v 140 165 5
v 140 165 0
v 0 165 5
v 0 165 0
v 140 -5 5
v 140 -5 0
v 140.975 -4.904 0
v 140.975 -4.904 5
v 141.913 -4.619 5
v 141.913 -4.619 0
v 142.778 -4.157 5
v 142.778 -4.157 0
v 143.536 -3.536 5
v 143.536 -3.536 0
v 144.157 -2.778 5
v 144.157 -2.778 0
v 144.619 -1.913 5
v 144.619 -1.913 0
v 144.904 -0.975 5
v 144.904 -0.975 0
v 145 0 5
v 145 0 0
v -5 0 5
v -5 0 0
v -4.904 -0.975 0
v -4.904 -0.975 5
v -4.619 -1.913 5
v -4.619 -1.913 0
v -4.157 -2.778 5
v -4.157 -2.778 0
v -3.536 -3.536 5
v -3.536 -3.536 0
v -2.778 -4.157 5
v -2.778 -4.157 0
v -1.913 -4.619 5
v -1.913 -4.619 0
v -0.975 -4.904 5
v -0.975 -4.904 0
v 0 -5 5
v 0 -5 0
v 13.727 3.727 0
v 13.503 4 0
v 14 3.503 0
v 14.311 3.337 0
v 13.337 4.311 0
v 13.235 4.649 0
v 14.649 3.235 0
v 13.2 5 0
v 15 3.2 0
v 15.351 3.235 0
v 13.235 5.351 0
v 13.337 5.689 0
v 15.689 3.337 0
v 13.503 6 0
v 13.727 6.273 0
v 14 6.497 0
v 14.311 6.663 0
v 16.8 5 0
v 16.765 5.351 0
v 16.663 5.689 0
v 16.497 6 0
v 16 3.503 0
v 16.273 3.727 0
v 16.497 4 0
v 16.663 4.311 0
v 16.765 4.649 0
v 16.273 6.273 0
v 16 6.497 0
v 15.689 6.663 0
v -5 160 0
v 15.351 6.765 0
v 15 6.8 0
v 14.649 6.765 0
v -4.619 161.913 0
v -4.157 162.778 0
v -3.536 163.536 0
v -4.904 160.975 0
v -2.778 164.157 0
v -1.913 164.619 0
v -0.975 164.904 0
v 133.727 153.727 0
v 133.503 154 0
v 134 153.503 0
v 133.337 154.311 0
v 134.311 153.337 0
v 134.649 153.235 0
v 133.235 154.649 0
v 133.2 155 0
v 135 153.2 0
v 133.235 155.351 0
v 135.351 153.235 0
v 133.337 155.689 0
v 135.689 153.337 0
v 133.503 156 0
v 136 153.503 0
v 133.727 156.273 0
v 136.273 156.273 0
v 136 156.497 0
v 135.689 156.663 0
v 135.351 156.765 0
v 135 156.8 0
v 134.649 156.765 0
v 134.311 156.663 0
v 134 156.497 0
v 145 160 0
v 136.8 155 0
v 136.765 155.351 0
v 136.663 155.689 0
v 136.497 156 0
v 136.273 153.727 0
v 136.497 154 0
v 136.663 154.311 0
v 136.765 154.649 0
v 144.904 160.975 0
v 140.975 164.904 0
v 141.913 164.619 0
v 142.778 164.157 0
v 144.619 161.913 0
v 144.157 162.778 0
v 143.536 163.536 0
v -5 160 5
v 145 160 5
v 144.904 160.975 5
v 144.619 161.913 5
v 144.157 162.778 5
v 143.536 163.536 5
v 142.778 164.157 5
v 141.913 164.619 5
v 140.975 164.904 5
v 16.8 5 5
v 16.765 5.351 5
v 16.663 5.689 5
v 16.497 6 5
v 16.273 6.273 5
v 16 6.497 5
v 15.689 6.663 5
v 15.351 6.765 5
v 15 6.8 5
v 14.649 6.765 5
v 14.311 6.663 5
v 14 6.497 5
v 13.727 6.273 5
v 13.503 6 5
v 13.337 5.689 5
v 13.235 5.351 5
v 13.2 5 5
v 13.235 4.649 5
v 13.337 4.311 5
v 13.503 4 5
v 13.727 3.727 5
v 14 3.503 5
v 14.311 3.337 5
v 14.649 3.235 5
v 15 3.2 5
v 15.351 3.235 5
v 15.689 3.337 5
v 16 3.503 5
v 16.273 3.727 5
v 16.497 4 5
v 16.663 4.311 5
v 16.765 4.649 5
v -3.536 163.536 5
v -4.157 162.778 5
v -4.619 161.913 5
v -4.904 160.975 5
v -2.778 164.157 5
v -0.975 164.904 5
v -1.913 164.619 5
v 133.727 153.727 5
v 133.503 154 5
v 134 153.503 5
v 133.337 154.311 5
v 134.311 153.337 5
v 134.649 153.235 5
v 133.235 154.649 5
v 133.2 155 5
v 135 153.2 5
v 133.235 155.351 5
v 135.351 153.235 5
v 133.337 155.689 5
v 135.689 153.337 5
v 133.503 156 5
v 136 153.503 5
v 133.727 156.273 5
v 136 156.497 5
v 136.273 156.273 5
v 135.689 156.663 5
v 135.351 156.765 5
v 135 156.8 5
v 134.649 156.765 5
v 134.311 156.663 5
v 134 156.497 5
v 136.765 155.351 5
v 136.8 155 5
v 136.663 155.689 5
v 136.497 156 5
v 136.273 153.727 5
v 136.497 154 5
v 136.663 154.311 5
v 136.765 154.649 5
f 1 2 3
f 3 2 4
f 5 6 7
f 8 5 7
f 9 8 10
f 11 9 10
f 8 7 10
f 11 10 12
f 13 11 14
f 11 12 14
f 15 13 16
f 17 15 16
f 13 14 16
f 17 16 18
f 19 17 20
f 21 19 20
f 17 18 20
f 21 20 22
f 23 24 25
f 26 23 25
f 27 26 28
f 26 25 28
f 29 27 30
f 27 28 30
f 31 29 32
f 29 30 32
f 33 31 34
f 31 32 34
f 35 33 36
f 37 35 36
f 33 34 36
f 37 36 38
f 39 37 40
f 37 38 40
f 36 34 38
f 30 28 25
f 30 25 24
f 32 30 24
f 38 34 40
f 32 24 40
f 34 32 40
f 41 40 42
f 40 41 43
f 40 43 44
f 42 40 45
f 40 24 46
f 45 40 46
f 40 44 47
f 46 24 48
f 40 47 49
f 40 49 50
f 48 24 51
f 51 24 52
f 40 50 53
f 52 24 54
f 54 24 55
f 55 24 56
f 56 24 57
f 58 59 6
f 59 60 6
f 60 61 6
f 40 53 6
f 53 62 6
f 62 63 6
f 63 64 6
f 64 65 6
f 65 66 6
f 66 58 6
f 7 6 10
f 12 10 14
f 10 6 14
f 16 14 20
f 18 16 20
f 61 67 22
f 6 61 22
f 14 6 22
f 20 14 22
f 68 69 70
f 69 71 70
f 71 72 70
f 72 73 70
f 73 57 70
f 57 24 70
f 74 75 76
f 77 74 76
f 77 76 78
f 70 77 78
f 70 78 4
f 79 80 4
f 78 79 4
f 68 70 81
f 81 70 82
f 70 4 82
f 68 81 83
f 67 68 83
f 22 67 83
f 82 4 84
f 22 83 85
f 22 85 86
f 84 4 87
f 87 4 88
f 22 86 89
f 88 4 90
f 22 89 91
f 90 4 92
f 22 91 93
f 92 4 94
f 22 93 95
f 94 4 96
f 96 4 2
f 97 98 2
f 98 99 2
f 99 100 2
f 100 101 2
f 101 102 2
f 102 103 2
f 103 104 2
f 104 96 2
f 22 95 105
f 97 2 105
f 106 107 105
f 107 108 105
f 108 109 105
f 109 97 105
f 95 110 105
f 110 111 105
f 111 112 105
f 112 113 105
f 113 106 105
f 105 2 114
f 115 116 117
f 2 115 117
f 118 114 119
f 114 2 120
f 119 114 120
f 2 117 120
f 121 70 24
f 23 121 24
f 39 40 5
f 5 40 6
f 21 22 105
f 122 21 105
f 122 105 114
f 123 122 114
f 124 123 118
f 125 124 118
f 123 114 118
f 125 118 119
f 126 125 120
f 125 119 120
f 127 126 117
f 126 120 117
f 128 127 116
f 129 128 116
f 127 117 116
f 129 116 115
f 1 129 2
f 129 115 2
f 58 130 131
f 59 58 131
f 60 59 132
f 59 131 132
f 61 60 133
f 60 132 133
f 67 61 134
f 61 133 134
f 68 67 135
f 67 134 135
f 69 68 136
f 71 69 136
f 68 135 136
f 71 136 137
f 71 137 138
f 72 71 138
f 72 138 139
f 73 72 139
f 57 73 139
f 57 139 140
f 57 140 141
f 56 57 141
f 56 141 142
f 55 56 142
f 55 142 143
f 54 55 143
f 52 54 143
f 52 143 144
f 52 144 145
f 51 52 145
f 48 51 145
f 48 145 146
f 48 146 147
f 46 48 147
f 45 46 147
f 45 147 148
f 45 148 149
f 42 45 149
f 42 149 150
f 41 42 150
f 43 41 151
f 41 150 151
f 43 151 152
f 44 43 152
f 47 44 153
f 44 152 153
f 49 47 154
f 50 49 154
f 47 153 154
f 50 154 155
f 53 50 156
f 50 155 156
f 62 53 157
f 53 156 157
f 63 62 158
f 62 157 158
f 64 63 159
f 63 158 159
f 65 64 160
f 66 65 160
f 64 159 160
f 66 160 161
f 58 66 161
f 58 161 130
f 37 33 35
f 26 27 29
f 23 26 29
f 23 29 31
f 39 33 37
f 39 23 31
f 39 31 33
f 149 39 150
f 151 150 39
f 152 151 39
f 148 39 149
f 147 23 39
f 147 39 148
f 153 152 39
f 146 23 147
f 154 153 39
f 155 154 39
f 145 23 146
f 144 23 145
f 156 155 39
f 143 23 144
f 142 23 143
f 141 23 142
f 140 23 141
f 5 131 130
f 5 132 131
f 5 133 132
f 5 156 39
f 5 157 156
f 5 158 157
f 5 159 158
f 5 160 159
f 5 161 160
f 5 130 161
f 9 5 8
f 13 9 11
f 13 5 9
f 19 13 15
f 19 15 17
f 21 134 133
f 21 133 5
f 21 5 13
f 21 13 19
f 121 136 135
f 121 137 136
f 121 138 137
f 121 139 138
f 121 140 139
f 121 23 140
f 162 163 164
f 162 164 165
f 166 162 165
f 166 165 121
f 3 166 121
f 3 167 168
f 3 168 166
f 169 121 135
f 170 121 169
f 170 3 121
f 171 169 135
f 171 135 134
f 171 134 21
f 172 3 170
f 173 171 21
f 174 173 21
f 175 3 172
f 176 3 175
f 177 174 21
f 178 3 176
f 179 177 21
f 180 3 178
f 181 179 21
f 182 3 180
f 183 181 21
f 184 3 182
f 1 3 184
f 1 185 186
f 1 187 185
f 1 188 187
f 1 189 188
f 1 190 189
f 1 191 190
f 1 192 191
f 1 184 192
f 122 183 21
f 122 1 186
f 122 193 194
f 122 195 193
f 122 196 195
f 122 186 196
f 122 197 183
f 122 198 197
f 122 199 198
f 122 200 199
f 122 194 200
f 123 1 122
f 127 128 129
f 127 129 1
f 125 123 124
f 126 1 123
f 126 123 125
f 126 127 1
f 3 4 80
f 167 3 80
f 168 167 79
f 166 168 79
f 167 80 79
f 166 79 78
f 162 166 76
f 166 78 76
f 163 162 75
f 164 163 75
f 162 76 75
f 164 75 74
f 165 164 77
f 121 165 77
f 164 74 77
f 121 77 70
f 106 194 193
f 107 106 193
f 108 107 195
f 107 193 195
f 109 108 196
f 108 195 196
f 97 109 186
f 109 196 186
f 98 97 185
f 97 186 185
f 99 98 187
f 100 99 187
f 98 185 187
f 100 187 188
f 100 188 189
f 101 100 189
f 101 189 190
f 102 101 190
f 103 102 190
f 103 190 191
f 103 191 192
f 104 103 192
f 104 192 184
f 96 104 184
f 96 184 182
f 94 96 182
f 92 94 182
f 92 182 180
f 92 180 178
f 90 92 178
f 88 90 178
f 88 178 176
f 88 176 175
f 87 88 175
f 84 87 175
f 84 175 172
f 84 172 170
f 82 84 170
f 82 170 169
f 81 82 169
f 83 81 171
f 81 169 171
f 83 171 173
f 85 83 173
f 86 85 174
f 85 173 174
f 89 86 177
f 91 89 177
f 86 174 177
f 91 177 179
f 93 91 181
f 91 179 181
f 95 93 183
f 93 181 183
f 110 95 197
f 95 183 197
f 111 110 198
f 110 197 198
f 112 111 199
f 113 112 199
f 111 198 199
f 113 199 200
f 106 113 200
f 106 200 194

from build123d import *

# Parameters (mm, degrees)
RESSALTO_EXTRUS_O1_DEPTH    = 5
FURO_COM_FOLGA_DE_M31_D     = 3.6
FURO_COM_FOLGA_DE_M31_DEPTH = 15
FURO_COM_FOLGA_DE_M31_TIP   = 1.081549114


with BuildPart() as part:
    # Esboço1 → Ressalto-extrusão1 (new body)
    with BuildSketch(Plane.XY):
        with BuildLine():
            Line((0, -5), (140, -5))
            ThreePointArc((140, -5), (143.535533906, -3.535533906), (145, 0))
            Line((145, 0), (145, 160))
            ThreePointArc((145, 160), (143.535533906, 163.535533906), (140, 165))
            Line((140, 165), (0, 165))
            ThreePointArc((0, 165), (-3.535533906, 163.535533906), (-5, 160))
            Line((-5, 160), (-5, 0))
            ThreePointArc((-5, 0), (-3.535533906, -3.535533906), (0, -5))
        make_face()
    extrude(amount=RESSALTO_EXTRUS_O1_DEPTH)

    # Furo com folga de M31
    with Locations(Plane(origin=(135, 155, 0), x_dir=(-1, 0, 0), z_dir=(0, 0, -1))):
        with Locations((0, 0), (120, -150)):
            Hole(FURO_COM_FOLGA_DE_M31_D / 2, depth=FURO_COM_FOLGA_DE_M31_DEPTH)
            with Locations((0, 0, -(FURO_COM_FOLGA_DE_M31_DEPTH + FURO_COM_FOLGA_DE_M31_TIP / 2))):  # 118° drill point
                Cone(0, FURO_COM_FOLGA_DE_M31_D / 2, FURO_COM_FOLGA_DE_M31_TIP, mode=Mode.SUBTRACT)


solid = part.part
